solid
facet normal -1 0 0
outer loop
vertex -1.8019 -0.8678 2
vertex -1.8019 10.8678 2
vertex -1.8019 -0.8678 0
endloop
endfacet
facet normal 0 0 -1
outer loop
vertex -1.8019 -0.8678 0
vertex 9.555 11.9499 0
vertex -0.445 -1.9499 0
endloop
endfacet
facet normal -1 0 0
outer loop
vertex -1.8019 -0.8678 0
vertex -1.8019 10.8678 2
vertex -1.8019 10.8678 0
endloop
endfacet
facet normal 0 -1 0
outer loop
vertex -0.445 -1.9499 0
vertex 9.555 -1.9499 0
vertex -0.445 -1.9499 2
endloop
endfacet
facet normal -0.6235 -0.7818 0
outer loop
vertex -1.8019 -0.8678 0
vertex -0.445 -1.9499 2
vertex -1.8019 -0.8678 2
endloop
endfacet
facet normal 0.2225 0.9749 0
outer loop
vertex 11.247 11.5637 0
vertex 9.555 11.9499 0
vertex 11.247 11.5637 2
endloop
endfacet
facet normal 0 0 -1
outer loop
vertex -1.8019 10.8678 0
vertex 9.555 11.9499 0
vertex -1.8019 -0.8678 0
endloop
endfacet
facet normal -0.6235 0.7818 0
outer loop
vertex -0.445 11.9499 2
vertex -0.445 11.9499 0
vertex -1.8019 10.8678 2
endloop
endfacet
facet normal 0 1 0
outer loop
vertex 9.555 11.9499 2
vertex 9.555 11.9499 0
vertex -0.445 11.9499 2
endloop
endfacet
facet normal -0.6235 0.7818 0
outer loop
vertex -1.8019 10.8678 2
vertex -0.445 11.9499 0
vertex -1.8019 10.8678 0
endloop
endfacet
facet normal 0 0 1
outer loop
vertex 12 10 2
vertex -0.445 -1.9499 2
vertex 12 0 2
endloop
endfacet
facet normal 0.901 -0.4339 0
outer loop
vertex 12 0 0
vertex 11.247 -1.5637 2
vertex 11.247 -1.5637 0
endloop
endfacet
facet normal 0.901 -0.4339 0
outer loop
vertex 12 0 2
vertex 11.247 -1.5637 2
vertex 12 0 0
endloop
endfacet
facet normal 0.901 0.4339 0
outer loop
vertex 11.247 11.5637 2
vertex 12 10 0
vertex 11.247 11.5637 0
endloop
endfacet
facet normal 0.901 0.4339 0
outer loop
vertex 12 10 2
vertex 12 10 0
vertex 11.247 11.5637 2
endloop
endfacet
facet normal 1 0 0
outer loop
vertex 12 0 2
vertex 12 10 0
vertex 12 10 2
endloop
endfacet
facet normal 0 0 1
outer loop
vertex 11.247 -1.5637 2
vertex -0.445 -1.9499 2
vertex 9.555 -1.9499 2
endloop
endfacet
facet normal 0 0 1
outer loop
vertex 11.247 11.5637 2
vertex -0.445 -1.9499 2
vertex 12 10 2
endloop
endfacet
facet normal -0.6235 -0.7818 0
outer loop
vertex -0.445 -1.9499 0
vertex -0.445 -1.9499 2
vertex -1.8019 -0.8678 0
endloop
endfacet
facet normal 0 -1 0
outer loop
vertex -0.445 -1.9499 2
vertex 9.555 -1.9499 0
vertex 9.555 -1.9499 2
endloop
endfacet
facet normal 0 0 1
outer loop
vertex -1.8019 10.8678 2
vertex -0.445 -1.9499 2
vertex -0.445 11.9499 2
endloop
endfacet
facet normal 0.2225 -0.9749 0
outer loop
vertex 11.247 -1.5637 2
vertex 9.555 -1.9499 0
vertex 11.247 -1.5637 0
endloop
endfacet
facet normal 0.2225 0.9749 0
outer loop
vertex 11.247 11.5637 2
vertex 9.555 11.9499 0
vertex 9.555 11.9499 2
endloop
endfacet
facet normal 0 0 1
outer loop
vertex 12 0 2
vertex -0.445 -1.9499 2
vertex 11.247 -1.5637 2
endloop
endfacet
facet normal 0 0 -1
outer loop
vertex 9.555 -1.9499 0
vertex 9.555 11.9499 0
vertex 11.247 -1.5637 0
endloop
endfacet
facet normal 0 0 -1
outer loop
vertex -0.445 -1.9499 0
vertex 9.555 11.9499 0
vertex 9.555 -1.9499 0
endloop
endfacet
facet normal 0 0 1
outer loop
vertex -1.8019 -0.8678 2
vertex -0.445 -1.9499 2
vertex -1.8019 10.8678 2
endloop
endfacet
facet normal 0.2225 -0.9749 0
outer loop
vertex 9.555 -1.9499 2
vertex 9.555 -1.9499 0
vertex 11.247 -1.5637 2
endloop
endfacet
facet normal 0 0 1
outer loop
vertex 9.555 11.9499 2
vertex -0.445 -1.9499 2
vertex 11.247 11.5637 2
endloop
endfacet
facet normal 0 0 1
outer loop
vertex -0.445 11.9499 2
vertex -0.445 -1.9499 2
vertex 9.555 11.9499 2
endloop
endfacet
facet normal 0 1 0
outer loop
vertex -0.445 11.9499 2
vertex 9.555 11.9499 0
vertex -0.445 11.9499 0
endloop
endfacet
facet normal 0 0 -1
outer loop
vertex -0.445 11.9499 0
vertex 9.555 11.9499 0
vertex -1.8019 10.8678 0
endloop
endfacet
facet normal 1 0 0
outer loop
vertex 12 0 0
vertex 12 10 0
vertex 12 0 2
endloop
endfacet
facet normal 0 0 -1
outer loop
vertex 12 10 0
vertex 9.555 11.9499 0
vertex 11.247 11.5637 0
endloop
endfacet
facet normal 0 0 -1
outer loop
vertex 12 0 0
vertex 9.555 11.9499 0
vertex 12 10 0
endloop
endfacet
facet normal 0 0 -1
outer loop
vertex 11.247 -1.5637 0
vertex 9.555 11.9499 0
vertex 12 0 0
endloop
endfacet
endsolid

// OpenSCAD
// Unit of length: Unit.MM
minkowski(convexity = 10)
{
   cube(size = [10.0, 10.0, 1.0], center = false);
   cylinder(h = 1.0, r = 2.0, center = false);
}
